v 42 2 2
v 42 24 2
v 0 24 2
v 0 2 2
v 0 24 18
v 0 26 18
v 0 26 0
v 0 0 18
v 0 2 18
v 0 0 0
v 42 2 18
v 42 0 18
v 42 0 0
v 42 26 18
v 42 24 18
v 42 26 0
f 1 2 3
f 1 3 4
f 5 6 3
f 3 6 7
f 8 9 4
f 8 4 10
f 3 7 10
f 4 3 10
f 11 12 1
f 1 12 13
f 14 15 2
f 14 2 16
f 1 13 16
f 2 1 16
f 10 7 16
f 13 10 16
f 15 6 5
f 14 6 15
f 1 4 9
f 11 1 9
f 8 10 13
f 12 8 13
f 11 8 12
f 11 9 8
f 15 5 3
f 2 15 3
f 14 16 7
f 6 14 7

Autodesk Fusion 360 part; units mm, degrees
sketch "Sketch1" plane through (0, 0, 0) normal (0, 0, 1) x (1, 0, 0)
  line L0 (0, 0) -> (42, 0)
  line L1 (42, 0) -> (42, 26)
  line L2 (42, 26) -> (0, 26)
  line L3 (0, 26) -> (0, 0)
  dimension "d1" = 42
  dimension "d2" = 26
extrude "Extrude1" add sketch "Sketch1" along normal blind 18
shell "Shell1" thickness 2 removed faces 1 at (14, 17.3333, 18)
extrude "Extrude2" cut 1 faces at (2, 16.6667, 7.3333) along direction (-1, 0, 0) blind 10
extrude "Extrude3" cut 1 faces at (40, 16.6667, 12.6667) along direction (1, 0, 0) blind 20
